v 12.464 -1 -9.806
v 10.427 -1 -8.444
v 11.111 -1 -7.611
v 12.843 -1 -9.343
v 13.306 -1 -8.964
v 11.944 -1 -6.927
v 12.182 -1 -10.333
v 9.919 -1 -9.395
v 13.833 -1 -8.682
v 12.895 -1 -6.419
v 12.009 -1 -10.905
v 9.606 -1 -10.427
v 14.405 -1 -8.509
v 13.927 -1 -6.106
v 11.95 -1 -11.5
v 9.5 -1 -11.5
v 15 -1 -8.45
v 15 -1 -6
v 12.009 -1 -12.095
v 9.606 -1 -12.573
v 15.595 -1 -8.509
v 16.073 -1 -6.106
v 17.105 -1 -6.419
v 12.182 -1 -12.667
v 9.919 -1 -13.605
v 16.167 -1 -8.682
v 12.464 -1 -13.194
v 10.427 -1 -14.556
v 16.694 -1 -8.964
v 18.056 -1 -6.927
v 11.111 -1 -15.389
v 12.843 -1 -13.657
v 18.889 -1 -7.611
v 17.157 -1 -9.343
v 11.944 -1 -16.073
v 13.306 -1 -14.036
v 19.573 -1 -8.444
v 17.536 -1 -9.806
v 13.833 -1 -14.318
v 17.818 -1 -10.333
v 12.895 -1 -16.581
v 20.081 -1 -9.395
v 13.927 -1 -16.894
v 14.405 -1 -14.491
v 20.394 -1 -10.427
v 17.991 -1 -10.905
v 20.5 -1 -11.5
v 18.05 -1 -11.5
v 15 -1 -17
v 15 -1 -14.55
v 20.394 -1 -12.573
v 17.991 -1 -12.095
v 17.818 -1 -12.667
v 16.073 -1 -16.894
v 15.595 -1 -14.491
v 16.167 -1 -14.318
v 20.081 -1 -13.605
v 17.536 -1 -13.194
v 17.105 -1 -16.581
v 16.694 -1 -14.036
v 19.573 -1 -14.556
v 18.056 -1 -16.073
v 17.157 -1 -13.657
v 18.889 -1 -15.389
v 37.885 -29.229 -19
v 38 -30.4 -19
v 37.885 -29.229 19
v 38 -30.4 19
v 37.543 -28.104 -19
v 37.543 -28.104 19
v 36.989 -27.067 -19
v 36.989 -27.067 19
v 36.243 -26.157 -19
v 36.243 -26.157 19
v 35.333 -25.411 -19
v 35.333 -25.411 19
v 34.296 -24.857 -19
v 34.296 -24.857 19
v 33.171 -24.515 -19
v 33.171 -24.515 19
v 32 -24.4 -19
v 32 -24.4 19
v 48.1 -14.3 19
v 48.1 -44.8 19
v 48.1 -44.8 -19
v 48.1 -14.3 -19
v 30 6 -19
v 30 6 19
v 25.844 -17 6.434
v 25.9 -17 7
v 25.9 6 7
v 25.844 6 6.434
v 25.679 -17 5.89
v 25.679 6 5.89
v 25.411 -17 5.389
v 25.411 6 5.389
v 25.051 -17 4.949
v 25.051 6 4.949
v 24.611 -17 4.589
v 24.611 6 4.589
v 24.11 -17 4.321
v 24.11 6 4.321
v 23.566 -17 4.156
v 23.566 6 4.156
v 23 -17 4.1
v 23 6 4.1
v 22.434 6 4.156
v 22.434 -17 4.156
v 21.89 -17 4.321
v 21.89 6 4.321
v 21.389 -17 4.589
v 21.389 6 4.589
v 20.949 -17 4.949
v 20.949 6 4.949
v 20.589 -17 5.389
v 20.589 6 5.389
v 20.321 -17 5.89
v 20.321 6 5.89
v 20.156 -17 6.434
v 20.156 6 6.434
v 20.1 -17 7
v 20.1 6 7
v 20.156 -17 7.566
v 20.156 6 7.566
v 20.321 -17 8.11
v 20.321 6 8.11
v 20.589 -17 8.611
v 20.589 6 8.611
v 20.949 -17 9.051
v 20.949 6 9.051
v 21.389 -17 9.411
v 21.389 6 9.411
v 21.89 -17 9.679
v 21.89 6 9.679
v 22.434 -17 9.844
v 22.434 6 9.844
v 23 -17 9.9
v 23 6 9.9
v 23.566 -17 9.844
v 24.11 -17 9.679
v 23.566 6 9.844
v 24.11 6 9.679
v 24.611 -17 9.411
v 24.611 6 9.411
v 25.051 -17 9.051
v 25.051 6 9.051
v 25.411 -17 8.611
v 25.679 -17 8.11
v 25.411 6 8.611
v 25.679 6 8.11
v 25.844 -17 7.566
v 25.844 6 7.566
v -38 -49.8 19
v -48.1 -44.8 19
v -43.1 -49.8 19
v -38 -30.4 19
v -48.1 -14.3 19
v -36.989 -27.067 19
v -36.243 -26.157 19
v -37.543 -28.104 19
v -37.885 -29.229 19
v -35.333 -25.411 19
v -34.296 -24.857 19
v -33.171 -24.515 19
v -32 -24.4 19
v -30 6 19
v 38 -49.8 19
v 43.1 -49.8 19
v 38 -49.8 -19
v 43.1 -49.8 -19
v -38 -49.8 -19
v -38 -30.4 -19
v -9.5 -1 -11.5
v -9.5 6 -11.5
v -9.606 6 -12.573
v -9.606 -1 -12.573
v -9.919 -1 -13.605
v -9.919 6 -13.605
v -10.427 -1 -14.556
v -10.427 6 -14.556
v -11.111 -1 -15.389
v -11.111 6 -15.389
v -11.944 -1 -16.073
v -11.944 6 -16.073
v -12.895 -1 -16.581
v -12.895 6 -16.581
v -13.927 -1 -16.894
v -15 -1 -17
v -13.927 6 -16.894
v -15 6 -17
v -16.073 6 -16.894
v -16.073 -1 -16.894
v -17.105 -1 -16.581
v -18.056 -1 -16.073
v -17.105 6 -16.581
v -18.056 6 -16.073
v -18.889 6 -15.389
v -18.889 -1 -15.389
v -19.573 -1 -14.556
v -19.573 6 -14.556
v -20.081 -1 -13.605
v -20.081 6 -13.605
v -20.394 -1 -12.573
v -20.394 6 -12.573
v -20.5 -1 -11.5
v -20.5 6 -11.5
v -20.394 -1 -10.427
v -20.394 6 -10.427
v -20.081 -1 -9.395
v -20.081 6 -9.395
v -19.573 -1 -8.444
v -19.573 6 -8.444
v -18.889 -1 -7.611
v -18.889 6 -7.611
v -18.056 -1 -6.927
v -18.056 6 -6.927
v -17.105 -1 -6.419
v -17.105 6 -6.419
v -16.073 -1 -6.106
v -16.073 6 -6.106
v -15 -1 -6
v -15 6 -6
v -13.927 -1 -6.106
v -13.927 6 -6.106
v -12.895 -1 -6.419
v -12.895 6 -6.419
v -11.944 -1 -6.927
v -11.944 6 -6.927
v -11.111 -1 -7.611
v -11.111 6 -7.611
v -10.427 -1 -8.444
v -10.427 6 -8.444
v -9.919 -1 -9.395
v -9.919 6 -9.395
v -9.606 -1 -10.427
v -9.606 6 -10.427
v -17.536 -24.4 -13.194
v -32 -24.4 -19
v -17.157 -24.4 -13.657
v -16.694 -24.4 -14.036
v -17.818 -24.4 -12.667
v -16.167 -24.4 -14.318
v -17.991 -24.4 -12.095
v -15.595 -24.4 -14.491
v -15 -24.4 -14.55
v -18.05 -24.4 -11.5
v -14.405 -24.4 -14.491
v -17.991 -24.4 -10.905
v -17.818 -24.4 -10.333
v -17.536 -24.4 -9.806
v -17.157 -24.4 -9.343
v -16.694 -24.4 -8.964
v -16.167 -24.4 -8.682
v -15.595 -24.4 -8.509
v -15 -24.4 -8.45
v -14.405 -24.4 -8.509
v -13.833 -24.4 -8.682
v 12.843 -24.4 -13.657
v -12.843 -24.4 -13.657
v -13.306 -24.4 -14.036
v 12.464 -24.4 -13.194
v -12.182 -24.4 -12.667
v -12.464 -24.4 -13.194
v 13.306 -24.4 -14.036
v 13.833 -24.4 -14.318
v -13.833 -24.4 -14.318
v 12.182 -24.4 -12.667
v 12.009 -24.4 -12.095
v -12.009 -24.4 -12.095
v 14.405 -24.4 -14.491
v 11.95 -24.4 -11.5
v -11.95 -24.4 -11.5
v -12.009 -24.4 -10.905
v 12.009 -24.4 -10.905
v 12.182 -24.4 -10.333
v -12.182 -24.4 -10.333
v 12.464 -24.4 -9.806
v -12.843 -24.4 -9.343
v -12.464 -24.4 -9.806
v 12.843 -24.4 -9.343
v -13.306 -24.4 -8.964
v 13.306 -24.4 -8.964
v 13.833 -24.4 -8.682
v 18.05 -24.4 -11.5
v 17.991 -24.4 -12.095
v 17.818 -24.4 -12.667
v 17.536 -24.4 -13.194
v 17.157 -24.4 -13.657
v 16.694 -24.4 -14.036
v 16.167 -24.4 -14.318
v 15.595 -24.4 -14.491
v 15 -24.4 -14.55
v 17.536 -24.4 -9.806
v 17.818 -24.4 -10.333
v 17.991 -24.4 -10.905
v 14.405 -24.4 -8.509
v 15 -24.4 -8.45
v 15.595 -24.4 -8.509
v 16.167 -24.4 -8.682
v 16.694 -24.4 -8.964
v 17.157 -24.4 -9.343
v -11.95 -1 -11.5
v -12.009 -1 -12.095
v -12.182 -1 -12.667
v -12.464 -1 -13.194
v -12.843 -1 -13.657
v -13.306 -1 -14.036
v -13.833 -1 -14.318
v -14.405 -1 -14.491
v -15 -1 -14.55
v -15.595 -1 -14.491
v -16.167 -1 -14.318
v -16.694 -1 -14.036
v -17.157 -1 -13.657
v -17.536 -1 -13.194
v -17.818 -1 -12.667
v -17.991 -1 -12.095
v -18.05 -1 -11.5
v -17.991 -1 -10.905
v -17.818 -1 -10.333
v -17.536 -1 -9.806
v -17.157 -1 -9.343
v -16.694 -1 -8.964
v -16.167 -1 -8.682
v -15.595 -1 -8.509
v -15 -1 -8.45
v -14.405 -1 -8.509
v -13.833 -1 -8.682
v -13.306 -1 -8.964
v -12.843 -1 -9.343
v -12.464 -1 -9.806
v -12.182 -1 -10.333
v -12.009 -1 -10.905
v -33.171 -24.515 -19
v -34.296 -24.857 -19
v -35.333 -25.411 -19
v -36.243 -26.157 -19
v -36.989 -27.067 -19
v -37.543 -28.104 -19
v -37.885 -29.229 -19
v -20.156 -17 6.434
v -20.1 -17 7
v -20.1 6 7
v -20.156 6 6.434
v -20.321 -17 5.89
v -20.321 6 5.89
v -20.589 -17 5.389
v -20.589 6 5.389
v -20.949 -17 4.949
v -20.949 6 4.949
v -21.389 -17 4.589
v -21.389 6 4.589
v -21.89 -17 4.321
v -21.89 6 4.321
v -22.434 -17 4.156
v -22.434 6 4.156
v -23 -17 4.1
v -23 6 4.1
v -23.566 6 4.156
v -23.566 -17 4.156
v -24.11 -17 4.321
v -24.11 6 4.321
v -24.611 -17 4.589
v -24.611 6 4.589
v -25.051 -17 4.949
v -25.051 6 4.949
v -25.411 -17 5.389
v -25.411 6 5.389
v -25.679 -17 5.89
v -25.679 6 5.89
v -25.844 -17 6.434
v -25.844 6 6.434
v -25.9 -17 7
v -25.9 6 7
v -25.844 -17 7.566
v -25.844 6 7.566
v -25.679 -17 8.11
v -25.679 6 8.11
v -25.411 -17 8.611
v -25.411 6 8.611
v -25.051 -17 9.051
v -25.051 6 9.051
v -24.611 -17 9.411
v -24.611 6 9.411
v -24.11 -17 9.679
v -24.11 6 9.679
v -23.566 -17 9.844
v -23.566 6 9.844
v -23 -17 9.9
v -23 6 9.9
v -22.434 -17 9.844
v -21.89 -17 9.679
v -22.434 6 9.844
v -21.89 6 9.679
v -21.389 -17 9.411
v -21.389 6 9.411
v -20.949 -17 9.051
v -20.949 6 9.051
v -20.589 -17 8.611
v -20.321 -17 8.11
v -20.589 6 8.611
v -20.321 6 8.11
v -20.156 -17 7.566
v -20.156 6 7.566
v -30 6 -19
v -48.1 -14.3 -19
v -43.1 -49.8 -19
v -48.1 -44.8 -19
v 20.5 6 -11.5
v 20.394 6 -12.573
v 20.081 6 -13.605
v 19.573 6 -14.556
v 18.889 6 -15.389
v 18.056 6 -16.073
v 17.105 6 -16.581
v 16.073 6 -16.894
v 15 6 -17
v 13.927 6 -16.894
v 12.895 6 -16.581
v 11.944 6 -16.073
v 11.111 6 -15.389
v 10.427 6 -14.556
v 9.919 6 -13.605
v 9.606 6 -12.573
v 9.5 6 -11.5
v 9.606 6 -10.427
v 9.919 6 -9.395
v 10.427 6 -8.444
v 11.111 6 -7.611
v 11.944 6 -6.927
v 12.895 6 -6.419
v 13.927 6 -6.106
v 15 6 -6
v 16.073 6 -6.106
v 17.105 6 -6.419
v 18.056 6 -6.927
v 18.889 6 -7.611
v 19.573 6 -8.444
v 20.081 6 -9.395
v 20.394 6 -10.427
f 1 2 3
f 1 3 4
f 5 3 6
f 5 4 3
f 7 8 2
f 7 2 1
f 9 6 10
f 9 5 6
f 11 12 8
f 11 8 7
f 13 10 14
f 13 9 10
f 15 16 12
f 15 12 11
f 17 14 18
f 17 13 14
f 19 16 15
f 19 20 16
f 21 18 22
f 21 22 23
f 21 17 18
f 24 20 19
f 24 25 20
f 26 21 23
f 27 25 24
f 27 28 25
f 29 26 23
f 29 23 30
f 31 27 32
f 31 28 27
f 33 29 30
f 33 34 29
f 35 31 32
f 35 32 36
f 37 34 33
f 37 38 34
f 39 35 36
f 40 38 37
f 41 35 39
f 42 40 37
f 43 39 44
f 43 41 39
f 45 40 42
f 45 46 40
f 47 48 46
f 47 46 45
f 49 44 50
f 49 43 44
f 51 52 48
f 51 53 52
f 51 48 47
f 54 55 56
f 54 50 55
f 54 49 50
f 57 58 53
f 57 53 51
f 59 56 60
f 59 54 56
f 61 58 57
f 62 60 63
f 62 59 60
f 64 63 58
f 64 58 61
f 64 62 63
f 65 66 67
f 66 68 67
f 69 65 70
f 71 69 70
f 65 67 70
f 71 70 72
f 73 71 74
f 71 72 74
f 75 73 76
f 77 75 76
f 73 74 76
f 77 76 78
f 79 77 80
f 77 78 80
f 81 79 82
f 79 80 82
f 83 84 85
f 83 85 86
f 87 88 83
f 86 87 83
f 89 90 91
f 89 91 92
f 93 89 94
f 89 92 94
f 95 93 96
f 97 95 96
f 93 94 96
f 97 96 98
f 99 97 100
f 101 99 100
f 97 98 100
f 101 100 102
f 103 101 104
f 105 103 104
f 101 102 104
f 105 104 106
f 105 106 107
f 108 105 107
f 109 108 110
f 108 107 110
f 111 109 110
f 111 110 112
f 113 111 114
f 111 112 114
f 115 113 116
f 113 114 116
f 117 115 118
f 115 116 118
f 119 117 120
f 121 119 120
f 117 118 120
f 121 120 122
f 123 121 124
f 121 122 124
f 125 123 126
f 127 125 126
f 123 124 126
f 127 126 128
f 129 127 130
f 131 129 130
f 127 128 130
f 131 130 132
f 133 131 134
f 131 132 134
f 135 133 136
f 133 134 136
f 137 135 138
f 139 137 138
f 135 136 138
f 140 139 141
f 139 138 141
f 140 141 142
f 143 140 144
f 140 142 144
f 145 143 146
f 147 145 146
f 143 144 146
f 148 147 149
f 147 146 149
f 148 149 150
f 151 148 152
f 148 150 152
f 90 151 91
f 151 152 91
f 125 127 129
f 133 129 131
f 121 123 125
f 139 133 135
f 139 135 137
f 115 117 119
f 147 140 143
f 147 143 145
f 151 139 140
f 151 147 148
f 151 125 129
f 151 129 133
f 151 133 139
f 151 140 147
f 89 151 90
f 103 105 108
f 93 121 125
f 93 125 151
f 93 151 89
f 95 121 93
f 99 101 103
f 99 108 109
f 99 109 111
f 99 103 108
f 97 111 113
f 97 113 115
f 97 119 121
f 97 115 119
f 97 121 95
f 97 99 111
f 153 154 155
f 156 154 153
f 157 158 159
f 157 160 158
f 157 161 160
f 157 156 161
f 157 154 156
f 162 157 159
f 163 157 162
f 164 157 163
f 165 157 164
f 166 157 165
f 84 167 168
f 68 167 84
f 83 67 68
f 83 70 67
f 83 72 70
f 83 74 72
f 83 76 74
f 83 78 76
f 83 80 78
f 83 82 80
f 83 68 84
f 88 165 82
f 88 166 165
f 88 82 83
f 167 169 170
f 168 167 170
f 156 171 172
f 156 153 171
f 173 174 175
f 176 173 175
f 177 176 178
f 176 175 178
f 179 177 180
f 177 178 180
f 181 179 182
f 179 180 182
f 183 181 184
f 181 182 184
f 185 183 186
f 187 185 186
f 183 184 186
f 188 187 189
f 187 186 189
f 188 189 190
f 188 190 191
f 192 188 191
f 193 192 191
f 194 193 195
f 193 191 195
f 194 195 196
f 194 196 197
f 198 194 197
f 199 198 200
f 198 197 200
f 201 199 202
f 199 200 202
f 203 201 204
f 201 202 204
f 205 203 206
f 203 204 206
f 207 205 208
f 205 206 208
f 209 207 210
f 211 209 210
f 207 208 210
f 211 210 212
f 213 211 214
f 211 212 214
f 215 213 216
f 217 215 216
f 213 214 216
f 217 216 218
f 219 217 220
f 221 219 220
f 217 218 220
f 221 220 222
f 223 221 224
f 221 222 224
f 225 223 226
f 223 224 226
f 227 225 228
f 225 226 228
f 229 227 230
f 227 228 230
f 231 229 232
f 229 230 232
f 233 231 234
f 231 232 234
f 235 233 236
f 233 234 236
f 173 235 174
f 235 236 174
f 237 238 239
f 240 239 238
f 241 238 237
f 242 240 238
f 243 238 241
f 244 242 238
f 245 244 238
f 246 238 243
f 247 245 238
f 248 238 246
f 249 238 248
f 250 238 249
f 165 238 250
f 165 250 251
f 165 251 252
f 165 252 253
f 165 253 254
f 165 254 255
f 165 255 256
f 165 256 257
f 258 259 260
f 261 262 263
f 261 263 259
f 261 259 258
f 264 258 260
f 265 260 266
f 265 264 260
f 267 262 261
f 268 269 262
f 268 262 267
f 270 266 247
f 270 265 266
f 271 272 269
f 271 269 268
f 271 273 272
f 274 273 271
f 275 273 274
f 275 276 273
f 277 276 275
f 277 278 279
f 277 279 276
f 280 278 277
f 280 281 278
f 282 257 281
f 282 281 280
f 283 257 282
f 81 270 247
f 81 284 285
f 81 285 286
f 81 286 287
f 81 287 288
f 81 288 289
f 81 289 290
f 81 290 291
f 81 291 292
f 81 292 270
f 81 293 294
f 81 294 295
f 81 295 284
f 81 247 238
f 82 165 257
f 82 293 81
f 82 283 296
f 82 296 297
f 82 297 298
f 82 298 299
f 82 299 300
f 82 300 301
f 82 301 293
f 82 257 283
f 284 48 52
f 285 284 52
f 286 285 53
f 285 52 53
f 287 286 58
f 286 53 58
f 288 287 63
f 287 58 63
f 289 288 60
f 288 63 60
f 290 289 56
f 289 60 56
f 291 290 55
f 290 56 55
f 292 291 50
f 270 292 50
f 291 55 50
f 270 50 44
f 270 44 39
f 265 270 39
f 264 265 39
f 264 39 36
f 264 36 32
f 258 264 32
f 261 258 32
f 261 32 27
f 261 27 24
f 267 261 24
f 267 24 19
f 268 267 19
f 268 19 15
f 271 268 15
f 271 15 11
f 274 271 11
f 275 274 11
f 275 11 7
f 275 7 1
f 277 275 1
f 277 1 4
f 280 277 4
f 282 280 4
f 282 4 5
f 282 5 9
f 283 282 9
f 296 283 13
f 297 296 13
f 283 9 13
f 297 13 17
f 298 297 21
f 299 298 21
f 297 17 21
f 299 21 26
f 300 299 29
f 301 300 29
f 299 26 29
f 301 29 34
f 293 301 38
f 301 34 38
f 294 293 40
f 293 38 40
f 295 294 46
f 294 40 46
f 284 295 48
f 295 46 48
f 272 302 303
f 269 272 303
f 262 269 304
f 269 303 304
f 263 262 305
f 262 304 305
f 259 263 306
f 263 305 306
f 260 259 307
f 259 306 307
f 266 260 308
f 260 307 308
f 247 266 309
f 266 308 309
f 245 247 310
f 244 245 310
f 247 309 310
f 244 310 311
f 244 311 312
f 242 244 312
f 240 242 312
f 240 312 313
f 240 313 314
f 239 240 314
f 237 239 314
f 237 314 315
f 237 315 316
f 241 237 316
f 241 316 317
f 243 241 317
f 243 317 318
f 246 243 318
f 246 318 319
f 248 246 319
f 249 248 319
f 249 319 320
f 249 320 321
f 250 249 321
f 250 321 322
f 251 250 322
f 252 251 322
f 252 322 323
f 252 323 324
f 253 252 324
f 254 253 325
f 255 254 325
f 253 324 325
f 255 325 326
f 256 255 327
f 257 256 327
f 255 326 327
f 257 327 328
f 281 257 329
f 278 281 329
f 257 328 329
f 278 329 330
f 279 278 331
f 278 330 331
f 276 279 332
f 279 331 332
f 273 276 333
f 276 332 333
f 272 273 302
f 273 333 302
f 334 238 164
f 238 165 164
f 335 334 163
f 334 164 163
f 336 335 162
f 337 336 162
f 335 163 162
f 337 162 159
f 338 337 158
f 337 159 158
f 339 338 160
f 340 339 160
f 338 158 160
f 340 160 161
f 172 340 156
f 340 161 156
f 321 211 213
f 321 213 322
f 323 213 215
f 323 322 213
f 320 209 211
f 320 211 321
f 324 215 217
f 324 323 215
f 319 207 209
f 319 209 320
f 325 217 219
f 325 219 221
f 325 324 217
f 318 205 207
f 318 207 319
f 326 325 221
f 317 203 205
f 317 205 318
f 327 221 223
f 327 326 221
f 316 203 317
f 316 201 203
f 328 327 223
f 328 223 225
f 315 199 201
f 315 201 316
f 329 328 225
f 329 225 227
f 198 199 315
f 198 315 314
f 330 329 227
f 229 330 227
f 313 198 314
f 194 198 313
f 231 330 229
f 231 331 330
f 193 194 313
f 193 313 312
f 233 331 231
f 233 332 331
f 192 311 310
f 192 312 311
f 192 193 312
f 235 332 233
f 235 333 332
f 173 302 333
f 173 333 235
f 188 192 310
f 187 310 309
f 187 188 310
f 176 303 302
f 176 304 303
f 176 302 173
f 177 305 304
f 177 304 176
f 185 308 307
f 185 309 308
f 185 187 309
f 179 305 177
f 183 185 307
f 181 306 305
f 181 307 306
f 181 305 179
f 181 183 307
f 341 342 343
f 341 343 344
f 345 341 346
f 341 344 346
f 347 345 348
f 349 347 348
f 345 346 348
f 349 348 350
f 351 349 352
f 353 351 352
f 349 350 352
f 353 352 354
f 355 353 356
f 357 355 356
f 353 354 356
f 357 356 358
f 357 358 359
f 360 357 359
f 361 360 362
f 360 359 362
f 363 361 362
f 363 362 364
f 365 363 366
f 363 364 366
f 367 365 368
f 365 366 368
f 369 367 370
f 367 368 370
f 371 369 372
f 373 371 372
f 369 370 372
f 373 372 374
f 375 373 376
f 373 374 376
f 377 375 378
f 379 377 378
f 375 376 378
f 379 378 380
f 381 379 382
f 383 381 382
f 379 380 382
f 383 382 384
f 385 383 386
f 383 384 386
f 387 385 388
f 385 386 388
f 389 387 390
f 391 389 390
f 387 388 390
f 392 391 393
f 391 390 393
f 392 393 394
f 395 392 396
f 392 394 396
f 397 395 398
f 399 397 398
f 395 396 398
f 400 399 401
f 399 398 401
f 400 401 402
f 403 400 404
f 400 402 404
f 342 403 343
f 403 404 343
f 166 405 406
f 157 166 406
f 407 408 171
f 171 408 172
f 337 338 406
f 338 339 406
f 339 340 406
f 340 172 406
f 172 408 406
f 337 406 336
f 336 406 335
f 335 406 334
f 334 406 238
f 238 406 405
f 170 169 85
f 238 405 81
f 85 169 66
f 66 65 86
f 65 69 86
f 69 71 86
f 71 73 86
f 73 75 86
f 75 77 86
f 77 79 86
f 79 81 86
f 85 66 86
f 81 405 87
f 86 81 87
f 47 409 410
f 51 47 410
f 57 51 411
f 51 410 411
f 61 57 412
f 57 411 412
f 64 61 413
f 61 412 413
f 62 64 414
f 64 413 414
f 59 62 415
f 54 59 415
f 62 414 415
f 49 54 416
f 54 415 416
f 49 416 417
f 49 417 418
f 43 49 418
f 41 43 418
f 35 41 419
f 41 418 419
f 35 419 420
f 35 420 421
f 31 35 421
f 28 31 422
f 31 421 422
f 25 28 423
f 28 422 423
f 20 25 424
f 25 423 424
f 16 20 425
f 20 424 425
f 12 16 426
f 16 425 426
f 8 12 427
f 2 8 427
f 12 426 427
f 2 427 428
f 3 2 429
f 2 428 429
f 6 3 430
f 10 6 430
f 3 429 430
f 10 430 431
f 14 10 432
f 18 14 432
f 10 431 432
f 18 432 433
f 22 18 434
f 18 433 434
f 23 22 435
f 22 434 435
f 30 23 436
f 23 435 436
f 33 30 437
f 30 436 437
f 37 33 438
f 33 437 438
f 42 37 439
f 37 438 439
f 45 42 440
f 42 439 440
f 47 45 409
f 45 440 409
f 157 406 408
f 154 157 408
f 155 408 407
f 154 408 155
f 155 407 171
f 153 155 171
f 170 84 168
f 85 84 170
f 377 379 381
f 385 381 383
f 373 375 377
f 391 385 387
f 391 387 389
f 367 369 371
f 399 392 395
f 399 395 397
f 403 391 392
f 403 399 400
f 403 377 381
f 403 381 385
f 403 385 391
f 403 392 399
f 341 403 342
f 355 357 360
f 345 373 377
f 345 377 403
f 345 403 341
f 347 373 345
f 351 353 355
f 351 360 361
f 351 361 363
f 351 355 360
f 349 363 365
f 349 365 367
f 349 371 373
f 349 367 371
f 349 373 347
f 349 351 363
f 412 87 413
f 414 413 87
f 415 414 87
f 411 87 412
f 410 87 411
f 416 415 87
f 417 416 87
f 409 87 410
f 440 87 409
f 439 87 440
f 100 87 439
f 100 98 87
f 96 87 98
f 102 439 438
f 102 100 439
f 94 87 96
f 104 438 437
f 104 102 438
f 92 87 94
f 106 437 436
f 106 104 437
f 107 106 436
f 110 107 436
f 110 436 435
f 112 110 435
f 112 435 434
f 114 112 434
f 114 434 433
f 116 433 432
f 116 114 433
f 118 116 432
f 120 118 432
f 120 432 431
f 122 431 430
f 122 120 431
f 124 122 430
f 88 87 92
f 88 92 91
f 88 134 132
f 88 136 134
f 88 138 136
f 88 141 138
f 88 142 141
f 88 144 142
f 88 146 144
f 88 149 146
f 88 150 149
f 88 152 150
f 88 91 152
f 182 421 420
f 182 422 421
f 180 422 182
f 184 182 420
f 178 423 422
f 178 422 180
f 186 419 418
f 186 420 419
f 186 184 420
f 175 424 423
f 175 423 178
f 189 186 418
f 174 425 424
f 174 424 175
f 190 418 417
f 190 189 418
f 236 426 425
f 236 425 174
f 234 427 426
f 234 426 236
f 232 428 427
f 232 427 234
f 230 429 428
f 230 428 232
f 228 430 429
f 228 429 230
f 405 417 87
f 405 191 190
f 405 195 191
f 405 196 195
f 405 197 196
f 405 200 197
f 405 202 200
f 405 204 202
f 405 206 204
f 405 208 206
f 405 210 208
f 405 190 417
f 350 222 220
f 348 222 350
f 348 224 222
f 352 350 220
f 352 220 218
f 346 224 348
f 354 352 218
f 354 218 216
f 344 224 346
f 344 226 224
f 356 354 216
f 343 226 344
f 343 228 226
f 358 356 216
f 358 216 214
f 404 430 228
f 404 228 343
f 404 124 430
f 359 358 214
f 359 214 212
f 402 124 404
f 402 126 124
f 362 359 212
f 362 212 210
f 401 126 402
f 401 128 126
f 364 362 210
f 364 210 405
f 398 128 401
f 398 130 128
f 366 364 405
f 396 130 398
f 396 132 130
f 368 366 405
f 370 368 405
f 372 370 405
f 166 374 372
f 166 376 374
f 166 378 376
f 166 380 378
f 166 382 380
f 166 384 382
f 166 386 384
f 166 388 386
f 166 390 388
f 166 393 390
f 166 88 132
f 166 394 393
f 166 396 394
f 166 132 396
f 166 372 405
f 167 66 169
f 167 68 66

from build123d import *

# Parameters (mm, degrees)
BOSS_EXTRUDE1_DEPTH = 19
CUT_EXTRUDE8_DEPTH  = 39
FILLET1_R           = 6
SKETCH2_R           = 3.05
CUT_EXTRUDE1_DEPTH  = 42
SKETCH3_R           = 5.5
CUT_EXTRUDE2_DEPTH  = 7
SKETCH8_R           = 2.9
CUT_EXTRUDE7_DEPTH  = 23
CHAMFER2_SIZE       = 5


with BuildPart() as part:
    # Sketch1 → Boss-Extrude1 (new body, symmetric)
    with BuildSketch(Plane.XY):
        Polygon((48.1, 6), (-48.1, 6), (-48.1, -49.8), (-38, -49.8), (-38, -24.4), (38, -24.4), (38, -49.8), (48.1, -49.8), align=None)
    extrude(amount=BOSS_EXTRUDE1_DEPTH, both=True)

    # Sketch9 → Cut-Extrude8 (cut, through all)
    with BuildSketch(Plane.XY.offset(19)):
        Polygon((-30, 6), (-48.1, -14.3), (-48.1, 6), align=None)
        Polygon((48.1, 6), (30, 6), (48.1, -14.3), align=None)
    extrude(amount=-CUT_EXTRUDE8_DEPTH, mode=Mode.SUBTRACT)

    # Fillet1
    fillet1_edges = [part.edges().sort_by_distance(p)[0] for p in [
        (38, -24.4, 0),
        (-38, -24.4, 0),
    ]]
    fillet(fillet1_edges, radius=FILLET1_R)

    # Sketch2 → Cut-Extrude1 (cut)
    with BuildSketch(Plane(origin=(0, 6, 0), x_dir=(1, 0, 0), z_dir=(0, 1, 0))):
        with Locations((-15, 11.5)):
            Circle(SKETCH2_R)
        with Locations((15, 11.5)):
            Circle(SKETCH2_R)
    extrude(amount=-CUT_EXTRUDE1_DEPTH, mode=Mode.SUBTRACT)

    # Sketch3 → Cut-Extrude2 (cut)
    with BuildSketch(Plane(origin=(0, 6, 0), x_dir=(1, 0, 0), z_dir=(0, 1, 0))):
        with Locations((-15, 11.5)):
            Circle(SKETCH3_R)
        with Locations((15, 11.5)):
            Circle(SKETCH3_R)
    extrude(amount=-CUT_EXTRUDE2_DEPTH, mode=Mode.SUBTRACT)

    # Sketch8 → Cut-Extrude7 (cut)
    with BuildSketch(Plane(origin=(0, 6, 0), x_dir=(1, 0, 0), z_dir=(0, 1, 0))):
        with Locations((-23, -7)):
            Circle(SKETCH8_R)
        with Locations((23, -7)):
            Circle(SKETCH8_R)
    extrude(amount=-CUT_EXTRUDE7_DEPTH, mode=Mode.SUBTRACT)

    # Chamfer2
    chamfer2_edges = [part.edges().sort_by_distance(p)[0] for p in [
        (48.1, -49.8, 0),
        (-48.1, -49.8, 0),
    ]]
    chamfer(chamfer2_edges, length=CHAMFER2_SIZE)


solid = part.part
